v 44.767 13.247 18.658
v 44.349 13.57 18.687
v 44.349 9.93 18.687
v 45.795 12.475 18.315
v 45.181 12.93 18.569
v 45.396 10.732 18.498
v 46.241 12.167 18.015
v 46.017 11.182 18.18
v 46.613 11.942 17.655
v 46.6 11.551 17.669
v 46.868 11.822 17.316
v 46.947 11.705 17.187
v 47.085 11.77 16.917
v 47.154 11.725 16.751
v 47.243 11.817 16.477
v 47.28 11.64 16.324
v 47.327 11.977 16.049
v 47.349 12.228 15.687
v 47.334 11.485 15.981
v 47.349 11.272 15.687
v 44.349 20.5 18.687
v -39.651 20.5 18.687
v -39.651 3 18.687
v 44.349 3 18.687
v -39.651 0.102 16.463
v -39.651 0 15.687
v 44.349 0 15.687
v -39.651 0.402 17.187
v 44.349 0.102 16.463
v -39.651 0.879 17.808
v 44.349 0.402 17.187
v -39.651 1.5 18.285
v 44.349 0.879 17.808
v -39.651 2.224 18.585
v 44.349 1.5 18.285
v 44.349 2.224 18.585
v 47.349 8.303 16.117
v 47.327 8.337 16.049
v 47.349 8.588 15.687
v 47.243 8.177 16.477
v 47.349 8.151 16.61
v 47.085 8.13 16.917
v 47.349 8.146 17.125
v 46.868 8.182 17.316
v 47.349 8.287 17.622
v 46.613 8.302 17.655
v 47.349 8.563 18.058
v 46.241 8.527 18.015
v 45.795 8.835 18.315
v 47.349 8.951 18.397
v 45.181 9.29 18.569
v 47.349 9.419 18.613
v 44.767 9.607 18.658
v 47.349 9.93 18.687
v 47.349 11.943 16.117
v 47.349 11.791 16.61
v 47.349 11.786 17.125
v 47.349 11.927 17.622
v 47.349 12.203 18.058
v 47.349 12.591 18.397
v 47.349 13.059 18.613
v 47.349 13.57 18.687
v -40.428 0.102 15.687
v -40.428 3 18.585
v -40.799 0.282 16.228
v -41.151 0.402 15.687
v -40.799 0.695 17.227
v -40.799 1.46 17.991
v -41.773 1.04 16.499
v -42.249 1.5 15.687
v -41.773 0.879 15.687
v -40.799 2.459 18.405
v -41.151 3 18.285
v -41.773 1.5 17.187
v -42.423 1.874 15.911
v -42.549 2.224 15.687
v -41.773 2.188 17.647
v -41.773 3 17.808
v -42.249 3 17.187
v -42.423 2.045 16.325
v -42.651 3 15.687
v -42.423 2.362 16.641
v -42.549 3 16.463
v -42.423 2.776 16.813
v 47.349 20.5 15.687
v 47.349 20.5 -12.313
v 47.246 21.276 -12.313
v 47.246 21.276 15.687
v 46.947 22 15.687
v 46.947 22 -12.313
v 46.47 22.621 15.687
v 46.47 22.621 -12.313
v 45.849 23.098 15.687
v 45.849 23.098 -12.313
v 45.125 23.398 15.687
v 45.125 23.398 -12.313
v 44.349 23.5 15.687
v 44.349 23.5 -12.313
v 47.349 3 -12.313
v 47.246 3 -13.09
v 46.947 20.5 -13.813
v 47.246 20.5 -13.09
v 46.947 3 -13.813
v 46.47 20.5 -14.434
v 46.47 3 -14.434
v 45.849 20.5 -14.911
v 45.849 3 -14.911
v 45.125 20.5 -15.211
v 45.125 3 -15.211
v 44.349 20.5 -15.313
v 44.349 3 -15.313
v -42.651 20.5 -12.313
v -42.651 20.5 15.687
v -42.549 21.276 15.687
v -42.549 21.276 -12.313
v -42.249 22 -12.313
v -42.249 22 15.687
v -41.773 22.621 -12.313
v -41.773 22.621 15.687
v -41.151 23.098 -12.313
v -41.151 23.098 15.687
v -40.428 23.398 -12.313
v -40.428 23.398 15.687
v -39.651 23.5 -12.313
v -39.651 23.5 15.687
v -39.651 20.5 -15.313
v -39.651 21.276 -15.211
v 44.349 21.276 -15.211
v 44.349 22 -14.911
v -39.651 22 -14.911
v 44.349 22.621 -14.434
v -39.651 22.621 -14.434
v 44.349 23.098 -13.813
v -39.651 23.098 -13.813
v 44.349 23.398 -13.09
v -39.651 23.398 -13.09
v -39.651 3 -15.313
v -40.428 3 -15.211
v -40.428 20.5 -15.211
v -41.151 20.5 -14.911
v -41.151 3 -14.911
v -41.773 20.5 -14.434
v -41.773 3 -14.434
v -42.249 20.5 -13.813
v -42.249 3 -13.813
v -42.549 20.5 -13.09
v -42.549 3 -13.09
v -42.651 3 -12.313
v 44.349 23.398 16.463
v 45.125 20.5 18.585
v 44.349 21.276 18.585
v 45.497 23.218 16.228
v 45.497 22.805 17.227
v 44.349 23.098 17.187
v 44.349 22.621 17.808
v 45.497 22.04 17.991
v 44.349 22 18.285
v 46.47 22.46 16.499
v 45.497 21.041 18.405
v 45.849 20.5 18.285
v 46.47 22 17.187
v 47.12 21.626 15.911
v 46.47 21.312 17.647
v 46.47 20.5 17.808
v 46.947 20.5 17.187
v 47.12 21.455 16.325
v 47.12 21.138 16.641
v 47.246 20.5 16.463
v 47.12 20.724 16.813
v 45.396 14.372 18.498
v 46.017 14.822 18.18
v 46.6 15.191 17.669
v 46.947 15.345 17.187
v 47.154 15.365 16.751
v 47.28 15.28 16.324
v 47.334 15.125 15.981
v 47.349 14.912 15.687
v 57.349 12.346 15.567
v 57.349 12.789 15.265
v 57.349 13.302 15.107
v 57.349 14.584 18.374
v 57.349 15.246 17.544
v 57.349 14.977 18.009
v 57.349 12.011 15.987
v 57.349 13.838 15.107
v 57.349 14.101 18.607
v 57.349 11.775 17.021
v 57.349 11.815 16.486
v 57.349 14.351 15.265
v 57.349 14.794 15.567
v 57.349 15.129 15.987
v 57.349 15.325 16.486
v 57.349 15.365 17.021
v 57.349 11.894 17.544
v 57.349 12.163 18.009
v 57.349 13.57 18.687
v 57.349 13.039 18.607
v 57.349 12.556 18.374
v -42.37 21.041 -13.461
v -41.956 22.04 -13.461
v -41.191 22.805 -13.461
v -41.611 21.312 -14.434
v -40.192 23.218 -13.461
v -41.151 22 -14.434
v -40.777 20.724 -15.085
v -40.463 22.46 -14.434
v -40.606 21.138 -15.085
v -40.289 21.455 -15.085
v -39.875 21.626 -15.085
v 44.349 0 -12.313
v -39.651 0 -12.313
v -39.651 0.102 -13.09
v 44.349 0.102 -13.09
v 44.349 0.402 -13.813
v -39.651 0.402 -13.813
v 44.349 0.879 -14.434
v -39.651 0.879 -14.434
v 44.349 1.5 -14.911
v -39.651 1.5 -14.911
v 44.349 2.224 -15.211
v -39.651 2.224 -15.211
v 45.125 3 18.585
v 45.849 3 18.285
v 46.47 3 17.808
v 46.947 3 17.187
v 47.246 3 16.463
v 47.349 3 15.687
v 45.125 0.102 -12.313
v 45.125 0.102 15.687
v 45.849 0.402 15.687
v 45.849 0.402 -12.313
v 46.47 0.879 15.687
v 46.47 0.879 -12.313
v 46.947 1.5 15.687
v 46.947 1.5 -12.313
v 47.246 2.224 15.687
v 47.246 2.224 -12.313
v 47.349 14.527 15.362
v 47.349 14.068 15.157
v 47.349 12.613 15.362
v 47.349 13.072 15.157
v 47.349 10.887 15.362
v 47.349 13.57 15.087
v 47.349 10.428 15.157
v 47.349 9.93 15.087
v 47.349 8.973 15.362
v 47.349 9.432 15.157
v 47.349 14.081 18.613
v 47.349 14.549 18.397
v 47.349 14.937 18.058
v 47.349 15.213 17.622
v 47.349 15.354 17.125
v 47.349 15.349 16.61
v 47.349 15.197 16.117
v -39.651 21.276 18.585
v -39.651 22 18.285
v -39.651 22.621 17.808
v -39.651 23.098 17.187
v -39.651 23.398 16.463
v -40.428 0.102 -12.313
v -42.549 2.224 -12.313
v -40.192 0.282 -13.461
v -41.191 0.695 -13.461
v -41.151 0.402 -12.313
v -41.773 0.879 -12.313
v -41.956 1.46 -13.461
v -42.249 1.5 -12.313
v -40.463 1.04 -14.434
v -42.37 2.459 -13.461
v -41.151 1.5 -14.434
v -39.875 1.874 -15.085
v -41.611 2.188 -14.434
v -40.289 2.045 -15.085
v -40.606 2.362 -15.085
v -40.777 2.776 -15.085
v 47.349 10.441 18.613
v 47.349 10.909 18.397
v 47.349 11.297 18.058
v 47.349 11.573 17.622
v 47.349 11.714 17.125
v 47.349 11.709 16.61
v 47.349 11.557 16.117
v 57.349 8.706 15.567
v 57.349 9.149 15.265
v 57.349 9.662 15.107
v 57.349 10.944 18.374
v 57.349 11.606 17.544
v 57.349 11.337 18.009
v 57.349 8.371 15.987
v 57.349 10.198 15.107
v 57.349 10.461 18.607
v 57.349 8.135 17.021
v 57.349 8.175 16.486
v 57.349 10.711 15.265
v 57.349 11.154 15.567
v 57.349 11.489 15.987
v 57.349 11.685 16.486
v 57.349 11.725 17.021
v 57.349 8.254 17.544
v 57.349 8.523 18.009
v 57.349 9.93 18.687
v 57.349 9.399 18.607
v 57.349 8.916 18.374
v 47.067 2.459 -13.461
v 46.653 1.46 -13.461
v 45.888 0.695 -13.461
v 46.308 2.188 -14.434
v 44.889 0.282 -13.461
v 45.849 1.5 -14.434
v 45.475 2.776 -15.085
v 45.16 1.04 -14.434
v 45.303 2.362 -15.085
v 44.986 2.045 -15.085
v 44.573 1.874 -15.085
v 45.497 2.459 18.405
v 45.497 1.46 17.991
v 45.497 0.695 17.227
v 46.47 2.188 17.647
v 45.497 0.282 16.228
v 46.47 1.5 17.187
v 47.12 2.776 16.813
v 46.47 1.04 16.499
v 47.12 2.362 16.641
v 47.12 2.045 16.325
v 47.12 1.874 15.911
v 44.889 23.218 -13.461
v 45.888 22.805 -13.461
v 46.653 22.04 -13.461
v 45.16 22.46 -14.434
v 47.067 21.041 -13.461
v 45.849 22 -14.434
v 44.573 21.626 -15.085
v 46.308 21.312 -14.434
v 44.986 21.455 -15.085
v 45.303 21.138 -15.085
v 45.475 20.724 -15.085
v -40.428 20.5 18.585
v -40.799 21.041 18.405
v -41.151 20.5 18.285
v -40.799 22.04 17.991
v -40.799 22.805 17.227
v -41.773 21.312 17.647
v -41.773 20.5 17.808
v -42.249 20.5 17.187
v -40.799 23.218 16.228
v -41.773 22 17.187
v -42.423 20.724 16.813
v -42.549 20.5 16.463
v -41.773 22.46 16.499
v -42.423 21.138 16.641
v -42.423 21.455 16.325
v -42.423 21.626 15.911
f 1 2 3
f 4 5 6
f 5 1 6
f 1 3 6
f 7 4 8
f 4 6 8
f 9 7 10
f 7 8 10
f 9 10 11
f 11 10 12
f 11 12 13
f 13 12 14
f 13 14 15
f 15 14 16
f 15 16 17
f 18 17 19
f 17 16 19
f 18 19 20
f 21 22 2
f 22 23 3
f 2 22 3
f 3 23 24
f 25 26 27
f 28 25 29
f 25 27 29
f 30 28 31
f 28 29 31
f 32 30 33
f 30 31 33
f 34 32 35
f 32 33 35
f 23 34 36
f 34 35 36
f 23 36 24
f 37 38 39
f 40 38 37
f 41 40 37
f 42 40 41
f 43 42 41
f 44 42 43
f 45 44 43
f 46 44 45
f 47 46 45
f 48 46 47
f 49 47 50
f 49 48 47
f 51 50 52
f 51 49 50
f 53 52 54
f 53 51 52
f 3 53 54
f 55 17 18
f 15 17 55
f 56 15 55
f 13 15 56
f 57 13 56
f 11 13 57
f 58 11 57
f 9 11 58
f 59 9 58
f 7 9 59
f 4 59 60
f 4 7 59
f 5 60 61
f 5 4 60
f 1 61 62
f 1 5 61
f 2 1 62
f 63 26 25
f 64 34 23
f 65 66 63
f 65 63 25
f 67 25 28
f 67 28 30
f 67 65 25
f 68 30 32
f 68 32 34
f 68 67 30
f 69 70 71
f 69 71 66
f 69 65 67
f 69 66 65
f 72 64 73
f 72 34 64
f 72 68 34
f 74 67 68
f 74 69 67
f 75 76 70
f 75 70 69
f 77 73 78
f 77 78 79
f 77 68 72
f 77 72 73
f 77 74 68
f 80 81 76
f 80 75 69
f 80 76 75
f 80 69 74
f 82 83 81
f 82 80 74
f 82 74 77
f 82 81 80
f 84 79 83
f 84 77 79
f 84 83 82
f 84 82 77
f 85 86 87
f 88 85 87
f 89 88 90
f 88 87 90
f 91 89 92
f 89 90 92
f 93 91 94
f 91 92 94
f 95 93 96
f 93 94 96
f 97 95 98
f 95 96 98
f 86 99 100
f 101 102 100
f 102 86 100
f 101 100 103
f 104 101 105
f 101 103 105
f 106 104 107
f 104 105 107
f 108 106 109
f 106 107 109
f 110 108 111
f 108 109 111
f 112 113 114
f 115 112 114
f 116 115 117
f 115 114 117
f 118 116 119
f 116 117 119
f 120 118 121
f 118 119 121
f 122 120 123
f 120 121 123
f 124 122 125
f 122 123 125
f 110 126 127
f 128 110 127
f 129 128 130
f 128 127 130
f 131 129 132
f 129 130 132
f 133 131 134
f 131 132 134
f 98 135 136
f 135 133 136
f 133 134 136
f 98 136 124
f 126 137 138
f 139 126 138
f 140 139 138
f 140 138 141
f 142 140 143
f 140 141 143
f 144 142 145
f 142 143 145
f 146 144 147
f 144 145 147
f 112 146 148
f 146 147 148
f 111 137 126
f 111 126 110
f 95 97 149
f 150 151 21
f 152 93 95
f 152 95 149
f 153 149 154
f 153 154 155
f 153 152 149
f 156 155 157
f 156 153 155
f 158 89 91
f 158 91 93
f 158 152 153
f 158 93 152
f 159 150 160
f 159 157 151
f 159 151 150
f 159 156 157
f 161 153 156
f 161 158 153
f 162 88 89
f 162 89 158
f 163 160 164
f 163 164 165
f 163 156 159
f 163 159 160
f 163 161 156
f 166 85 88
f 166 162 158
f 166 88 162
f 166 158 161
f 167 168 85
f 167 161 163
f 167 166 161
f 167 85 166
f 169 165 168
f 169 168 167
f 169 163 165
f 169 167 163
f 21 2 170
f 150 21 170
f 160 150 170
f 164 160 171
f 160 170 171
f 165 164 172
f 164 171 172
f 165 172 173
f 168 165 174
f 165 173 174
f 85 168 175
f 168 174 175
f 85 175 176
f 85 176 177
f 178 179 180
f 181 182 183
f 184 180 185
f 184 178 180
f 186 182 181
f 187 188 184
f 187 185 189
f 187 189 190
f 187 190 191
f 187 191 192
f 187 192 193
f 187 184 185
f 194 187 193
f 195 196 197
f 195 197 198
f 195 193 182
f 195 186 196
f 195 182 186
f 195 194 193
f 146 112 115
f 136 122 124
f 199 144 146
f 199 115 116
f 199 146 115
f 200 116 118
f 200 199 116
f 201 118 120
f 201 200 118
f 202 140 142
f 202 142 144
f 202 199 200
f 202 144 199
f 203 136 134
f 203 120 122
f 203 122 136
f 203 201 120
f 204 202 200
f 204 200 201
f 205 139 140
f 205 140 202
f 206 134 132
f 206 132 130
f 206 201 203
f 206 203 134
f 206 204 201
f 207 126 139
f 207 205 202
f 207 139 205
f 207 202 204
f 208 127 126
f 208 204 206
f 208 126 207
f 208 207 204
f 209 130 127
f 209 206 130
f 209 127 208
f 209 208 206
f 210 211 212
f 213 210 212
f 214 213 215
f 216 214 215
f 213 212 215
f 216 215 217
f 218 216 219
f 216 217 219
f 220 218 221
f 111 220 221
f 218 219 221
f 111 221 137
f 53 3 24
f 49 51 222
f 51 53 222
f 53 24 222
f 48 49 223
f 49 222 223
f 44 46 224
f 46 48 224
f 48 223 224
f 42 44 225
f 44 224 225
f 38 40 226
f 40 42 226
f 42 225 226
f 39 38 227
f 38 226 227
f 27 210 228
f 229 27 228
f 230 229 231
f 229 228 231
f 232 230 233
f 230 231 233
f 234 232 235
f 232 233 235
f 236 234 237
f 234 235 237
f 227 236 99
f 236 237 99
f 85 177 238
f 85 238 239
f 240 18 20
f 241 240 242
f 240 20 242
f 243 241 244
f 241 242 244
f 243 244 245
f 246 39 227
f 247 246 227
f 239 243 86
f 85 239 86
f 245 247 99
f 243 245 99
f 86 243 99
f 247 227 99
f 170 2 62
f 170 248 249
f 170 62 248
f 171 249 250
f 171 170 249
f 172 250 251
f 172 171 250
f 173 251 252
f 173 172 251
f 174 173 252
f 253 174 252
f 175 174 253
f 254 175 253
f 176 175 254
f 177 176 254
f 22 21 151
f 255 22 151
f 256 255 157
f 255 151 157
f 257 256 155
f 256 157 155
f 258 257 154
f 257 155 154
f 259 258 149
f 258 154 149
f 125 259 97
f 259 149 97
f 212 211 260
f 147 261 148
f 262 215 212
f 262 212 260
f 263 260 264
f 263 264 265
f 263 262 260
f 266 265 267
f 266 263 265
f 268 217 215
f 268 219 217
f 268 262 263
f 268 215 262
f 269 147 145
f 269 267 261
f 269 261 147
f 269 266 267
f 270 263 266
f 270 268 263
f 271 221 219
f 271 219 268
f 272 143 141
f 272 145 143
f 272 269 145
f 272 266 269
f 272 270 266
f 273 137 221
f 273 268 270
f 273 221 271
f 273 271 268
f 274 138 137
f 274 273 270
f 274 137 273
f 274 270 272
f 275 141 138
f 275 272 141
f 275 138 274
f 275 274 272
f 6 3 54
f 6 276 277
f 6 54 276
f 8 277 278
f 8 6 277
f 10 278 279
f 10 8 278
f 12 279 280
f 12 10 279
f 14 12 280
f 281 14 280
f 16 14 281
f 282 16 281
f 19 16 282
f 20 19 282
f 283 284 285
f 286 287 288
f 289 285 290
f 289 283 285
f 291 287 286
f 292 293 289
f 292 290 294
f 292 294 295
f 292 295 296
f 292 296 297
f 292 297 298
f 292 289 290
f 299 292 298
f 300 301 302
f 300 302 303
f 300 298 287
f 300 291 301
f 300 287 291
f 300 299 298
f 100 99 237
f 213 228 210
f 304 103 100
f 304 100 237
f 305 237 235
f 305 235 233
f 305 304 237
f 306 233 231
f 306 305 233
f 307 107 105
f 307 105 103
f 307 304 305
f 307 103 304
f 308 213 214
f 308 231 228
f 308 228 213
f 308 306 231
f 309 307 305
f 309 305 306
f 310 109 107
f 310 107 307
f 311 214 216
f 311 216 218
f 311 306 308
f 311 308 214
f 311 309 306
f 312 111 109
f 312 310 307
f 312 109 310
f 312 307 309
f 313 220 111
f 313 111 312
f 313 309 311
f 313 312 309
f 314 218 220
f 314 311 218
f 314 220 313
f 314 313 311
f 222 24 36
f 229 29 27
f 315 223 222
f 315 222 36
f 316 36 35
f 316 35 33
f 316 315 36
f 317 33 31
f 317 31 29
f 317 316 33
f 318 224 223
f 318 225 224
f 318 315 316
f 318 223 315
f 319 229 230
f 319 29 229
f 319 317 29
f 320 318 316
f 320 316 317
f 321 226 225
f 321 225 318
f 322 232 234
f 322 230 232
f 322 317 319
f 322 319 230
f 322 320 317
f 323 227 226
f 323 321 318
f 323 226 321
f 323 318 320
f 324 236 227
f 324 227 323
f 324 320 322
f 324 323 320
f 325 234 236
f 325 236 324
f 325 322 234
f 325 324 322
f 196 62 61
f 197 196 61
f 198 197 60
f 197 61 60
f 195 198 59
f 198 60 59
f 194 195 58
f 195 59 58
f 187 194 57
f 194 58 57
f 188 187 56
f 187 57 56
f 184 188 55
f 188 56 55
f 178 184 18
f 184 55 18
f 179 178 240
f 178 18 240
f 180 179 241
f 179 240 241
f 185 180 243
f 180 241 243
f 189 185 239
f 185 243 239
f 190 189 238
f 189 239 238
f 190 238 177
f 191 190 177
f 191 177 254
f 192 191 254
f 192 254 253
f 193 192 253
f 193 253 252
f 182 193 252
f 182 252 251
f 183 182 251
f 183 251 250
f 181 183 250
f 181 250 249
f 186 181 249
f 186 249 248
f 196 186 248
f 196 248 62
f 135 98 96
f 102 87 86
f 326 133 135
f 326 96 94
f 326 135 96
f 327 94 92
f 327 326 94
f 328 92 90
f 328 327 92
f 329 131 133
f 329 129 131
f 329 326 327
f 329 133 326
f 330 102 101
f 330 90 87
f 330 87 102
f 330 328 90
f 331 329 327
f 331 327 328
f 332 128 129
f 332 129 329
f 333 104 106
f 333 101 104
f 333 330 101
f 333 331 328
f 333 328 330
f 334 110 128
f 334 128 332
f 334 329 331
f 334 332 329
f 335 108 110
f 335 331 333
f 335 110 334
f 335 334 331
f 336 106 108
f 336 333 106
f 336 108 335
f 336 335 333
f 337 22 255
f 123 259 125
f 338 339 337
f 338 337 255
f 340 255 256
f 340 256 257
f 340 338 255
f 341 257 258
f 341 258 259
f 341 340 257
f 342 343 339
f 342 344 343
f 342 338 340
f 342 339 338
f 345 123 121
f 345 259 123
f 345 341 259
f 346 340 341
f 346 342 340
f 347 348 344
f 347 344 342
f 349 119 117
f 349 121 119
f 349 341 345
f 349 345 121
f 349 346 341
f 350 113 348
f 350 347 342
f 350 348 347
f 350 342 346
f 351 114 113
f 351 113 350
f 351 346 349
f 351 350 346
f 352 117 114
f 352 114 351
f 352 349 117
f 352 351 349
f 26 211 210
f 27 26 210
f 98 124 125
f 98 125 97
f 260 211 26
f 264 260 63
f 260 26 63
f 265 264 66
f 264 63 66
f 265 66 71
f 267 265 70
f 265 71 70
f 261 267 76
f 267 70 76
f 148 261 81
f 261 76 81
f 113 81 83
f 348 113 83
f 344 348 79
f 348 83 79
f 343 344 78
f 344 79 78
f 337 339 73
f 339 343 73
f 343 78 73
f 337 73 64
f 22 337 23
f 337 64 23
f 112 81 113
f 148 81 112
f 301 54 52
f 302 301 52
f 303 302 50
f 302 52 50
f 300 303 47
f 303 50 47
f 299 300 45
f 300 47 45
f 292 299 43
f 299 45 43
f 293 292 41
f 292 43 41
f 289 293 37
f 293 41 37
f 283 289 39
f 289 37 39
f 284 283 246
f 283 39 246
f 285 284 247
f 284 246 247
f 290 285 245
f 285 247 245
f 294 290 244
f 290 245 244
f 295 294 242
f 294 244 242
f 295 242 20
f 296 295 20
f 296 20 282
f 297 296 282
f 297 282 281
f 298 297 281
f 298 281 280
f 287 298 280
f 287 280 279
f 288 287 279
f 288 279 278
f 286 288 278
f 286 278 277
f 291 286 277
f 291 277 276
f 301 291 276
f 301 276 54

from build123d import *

# Parameters (mm, degrees)
SKETCH1_W           = 90
SKETCH1_H           = 34
BOSS_EXTRUDE1_DEPTH = 23.5
SKETCH2_R           = 1.8
BOSS_EXTRUDE4_DEPTH = 10
FILLET1_R           = 3


with BuildPart() as part:
    # Sketch1 → Boss-Extrude1 (new body)
    with BuildSketch(Plane(origin=(0, 0, 0), x_dir=(1, 0, 0), z_dir=(0, 1, 0))):
        with Locations((2.348643006, -1.686847599)):
            Rectangle(SKETCH1_W, SKETCH1_H)
    extrude(amount=BOSS_EXTRUDE1_DEPTH)

    # Sketch2 → Boss-Extrude4 (add)
    with BuildSketch(Plane(origin=(47.348643006, 0, 0), x_dir=(0, 0, -1), z_dir=(1, 0, 0))):
        with Locations(Location((-16.886847599, 13.57, 0), (0, 0, 180))):
            Circle(SKETCH2_R)
        with Locations(Location((-16.886847599, 9.93, 0), (0, 0, 180))):
            Circle(SKETCH2_R)
    extrude(amount=BOSS_EXTRUDE4_DEPTH)

    # Fillet1
    # the kernel refuses this fillet: 3 mm, written as the material it takes off along each edge
    with BuildSketch(Plane(origin=(44.348643006, 20.5, -12.313152401), x_dir=(1, 0, 0), z_dir=(0, 0, -1))) as fillet1_piece_1_section:
        Polygon((0, 0), (FILLET1_R * 1.02, 0), (FILLET1_R * 1.02, -FILLET1_R * 1.02), (0, -FILLET1_R * 1.02), align=None)
    fillet1_piece_1 = extrude(amount=FILLET1_R * 1.02, mode=Mode.PRIVATE)
    fillet1_piece_1 = fillet1_piece_1 - Plane(origin=(44.348643006, 20.5, -12.313152401), x_dir=(-0.7071067811865475, -0.7071067811865475, 0), z_dir=(0, 0, -1)) * Sphere(FILLET1_R, mode=Mode.PRIVATE)
    add(fillet1_piece_1, mode=Mode.SUBTRACT)
    with BuildSketch(Plane(origin=(44.348643006, 20.5, 15.686847599), x_dir=(0, 1, 0), z_dir=(1, 0, 0))) as fillet1_piece_2_section:
        Polygon((0, 0), (FILLET1_R * 1.02, 0), (FILLET1_R * 1.02, FILLET1_R * 1.02), (0, FILLET1_R * 1.02), align=None)
    fillet1_piece_2 = extrude(amount=FILLET1_R * 1.02, mode=Mode.PRIVATE)
    fillet1_piece_2 = fillet1_piece_2 - Plane(origin=(44.348643006, 20.5, 15.686847599), x_dir=(0, -0.7071067811865475, -0.7071067811865475), z_dir=(1, 0, 0)) * Sphere(FILLET1_R, mode=Mode.PRIVATE)
    add(fillet1_piece_2, mode=Mode.SUBTRACT)
    with BuildSketch(Plane(origin=(-39.651356994, 20.5, -12.313152401), x_dir=(-1, 0, 0), z_dir=(0, 0, -1))) as fillet1_piece_3_section:
        Polygon((0, 0), (FILLET1_R * 1.02, 0), (FILLET1_R * 1.02, FILLET1_R * 1.02), (0, FILLET1_R * 1.02), align=None)
    fillet1_piece_3 = extrude(amount=FILLET1_R * 1.02, mode=Mode.PRIVATE)
    fillet1_piece_3 = fillet1_piece_3 - Plane(origin=(-39.651356994, 20.5, -12.313152401), x_dir=(0.7071067811865475, -0.7071067811865475, 0), z_dir=(0, 0, -1)) * Sphere(FILLET1_R, mode=Mode.PRIVATE)
    add(fillet1_piece_3, mode=Mode.SUBTRACT)
    with BuildSketch(Plane(origin=(44.348643006, 3, 15.686847599), x_dir=(0, -1, 0), z_dir=(1, 0, 0))) as fillet1_piece_4_section:
        Polygon((0, 0), (FILLET1_R * 1.02, 0), (FILLET1_R * 1.02, -FILLET1_R * 1.02), (0, -FILLET1_R * 1.02), align=None)
    fillet1_piece_4 = extrude(amount=FILLET1_R * 1.02, mode=Mode.PRIVATE)
    fillet1_piece_4 = fillet1_piece_4 - Plane(origin=(44.348643006, 3, 15.686847599), x_dir=(0, 0.7071067811865475, -0.7071067811865475), z_dir=(1, 0, 0)) * Sphere(FILLET1_R, mode=Mode.PRIVATE)
    add(fillet1_piece_4, mode=Mode.SUBTRACT)
    with BuildSketch(Plane(origin=(-39.651356994, 20.5, 15.686847599), x_dir=(0, 1, 0), z_dir=(-1, 0, 0))) as fillet1_piece_5_section:
        Polygon((0, 0), (FILLET1_R * 1.02, 0), (FILLET1_R * 1.02, -FILLET1_R * 1.02), (0, -FILLET1_R * 1.02), align=None)
    fillet1_piece_5 = extrude(amount=FILLET1_R * 1.02, mode=Mode.PRIVATE)
    fillet1_piece_5 = fillet1_piece_5 - Plane(origin=(-39.651356994, 20.5, 15.686847599), x_dir=(0, -0.7071067811865475, -0.7071067811865475), z_dir=(-1, 0, 0)) * Sphere(FILLET1_R, mode=Mode.PRIVATE)
    add(fillet1_piece_5, mode=Mode.SUBTRACT)
    with BuildSketch(Plane(origin=(-39.651356994, 3, -12.313152401), x_dir=(-1, 0, 0), z_dir=(0, 0, -1))) as fillet1_piece_6_section:
        Polygon((0, 0), (FILLET1_R * 1.02, 0), (FILLET1_R * 1.02, -FILLET1_R * 1.02), (0, -FILLET1_R * 1.02), align=None)
    fillet1_piece_6 = extrude(amount=FILLET1_R * 1.02, mode=Mode.PRIVATE)
    fillet1_piece_6 = fillet1_piece_6 - Plane(origin=(-39.651356994, 3, -12.313152401), x_dir=(0.7071067811865475, 0.7071067811865475, 0), z_dir=(0, 0, -1)) * Sphere(FILLET1_R, mode=Mode.PRIVATE)
    add(fillet1_piece_6, mode=Mode.SUBTRACT)
    with BuildSketch(Plane(origin=(44.348643006, 3, -12.313152401), x_dir=(1, 0, 0), z_dir=(0, 0, -1))) as fillet1_piece_7_section:
        Polygon((0, 0), (FILLET1_R * 1.02, 0), (FILLET1_R * 1.02, FILLET1_R * 1.02), (0, FILLET1_R * 1.02), align=None)
    fillet1_piece_7 = extrude(amount=FILLET1_R * 1.02, mode=Mode.PRIVATE)
    fillet1_piece_7 = fillet1_piece_7 - Plane(origin=(44.348643006, 3, -12.313152401), x_dir=(-0.7071067811865475, 0.7071067811865475, 0), z_dir=(0, 0, -1)) * Sphere(FILLET1_R, mode=Mode.PRIVATE)
    add(fillet1_piece_7, mode=Mode.SUBTRACT)
    with BuildSketch(Plane(origin=(-39.651356994, 3, 15.686847599), x_dir=(0, -1, 0), z_dir=(-1, 0, 0))) as fillet1_piece_8_section:
        Polygon((0, 0), (FILLET1_R * 1.02, 0), (FILLET1_R * 1.02, FILLET1_R * 1.02), (0, FILLET1_R * 1.02), align=None)
    fillet1_piece_8 = extrude(amount=FILLET1_R * 1.02, mode=Mode.PRIVATE)
    fillet1_piece_8 = fillet1_piece_8 - Plane(origin=(-39.651356994, 3, 15.686847599), x_dir=(0, 0.7071067811865475, -0.7071067811865475), z_dir=(-1, 0, 0)) * Sphere(FILLET1_R, mode=Mode.PRIVATE)
    add(fillet1_piece_8, mode=Mode.SUBTRACT)
    with BuildSketch(Plane(origin=(47.348643006, 23.5, -12.313152401), x_dir=(0, -1, 0), z_dir=(0, 0, 1)), Plane(origin=(-42.651356994, 23.5, 15.686847599), x_dir=(0, -1, 0), z_dir=(0, 0, -1))) as fillet1_piece_9:
        with BuildLine():
            CenterArc((FILLET1_R, -FILLET1_R), FILLET1_R, 90, 90)
            Line((0, -FILLET1_R), (0, 0))
            Line((0, 0), (FILLET1_R, 0))
        make_face()
    extrude(amount=28, mode=Mode.SUBTRACT)
    with BuildSketch(Plane(origin=(-39.651356994, 23.5, -15.313152401), x_dir=(0, -1, 0), z_dir=(1, 0, 0)), Plane(origin=(44.348643006, 0, 18.686847599), x_dir=(0, 0, -1), z_dir=(-1, 0, 0))) as fillet1_piece_10:
        with BuildLine():
            CenterArc((FILLET1_R, -FILLET1_R), FILLET1_R, 90, 90)
            Line((0, -FILLET1_R), (0, 0))
            Line((0, 0), (FILLET1_R, 0))
        make_face()
    extrude(amount=84, mode=Mode.SUBTRACT)
    with BuildSketch(Plane(origin=(47.348643006, 9.93, 18.686847599), x_dir=(0, 0, -1), z_dir=(0, 1, 0))) as fillet1_piece_11_section:
        with BuildLine():
            CenterArc((FILLET1_R, FILLET1_R), FILLET1_R, 180, 90)
            Line((0, FILLET1_R), (0, 0))
            Line((0, 0), (FILLET1_R, 0))
        make_face()
    fillet1_piece_11 = extrude(amount=3.64, mode=Mode.PRIVATE)
    fillet1_piece_11 = fillet1_piece_11 - Plane(origin=(46.419832721, 13.57, 16.886847599), x_dir=(0, 0, 1), z_dir=(-1, 0, 0)) * Cylinder(1.8, 20, mode=Mode.PRIVATE)
    fillet1_piece_11 = fillet1_piece_11 - Plane(origin=(46.419832721, 9.93, 16.886847599), x_dir=(0, 0, 1), z_dir=(-1, 0, 0)) * Cylinder(1.8, 20, mode=Mode.PRIVATE)
    add(fillet1_piece_11, mode=Mode.SUBTRACT)
    with BuildSketch(Plane(origin=(47.348643006, 3, 18.686847599), x_dir=(0, 0, -1), z_dir=(0, 1, 0))) as fillet1_piece_12_section:
        with BuildLine():
            CenterArc((FILLET1_R, FILLET1_R), FILLET1_R, 180, 90)
            Line((0, FILLET1_R), (0, 0))
            Line((0, 0), (FILLET1_R, 0))
        make_face()
    fillet1_piece_12 = extrude(amount=6.93, mode=Mode.PRIVATE)
    fillet1_piece_12 = fillet1_piece_12 - Plane(origin=(46.65046867, 9.93, 16.886847599), x_dir=(0, 0, 1), z_dir=(-1, 0, 0)) * Cylinder(1.8, 26, mode=Mode.PRIVATE)
    add(fillet1_piece_12, mode=Mode.SUBTRACT)
    with BuildSketch(Plane(origin=(-39.651356994, 0, -15.313152401), x_dir=(0, 1, 0), z_dir=(1, 0, 0)), Plane(origin=(44.348643006, 23.5, 18.686847599), x_dir=(0, 0, -1), z_dir=(-1, 0, 0))) as fillet1_piece_13:
        with BuildLine():
            CenterArc((FILLET1_R, FILLET1_R), FILLET1_R, 180, 90)
            Line((0, FILLET1_R), (0, 0))
            Line((0, 0), (FILLET1_R, 0))
        make_face()
    extrude(amount=84, mode=Mode.SUBTRACT)
    with BuildSketch(Plane(origin=(47.348643006, 0, -12.313152401), x_dir=(0, 1, 0), z_dir=(0, 0, 1)), Plane(origin=(-42.651356994, 0, 15.686847599), x_dir=(0, 1, 0), z_dir=(0, 0, -1))) as fillet1_piece_14:
        with BuildLine():
            CenterArc((FILLET1_R, FILLET1_R), FILLET1_R, 180, 90)
            Line((0, FILLET1_R), (0, 0))
            Line((0, 0), (FILLET1_R, 0))
        make_face()
    extrude(amount=28, mode=Mode.SUBTRACT)
    with BuildSketch(Plane(origin=(-42.651356994, 3, -15.313152401), x_dir=(1, 0, 0), z_dir=(0, 1, 0)), Plane(origin=(-42.651356994, 3, 18.686847599), x_dir=(0, 0, -1), z_dir=(0, 1, 0))) as fillet1_piece_15:
        with BuildLine():
            CenterArc((FILLET1_R, -FILLET1_R), FILLET1_R, 90, 90)
            Line((0, -FILLET1_R), (0, 0))
            Line((0, 0), (FILLET1_R, 0))
        make_face()
    extrude(amount=17.5, mode=Mode.SUBTRACT)
    with BuildSketch(Plane(origin=(47.348643006, 3, -15.313152401), x_dir=(-1, 0, 0), z_dir=(0, 1, 0))) as fillet1_piece_16:
        with BuildLine():
            CenterArc((FILLET1_R, FILLET1_R), FILLET1_R, 180, 90)
            Line((0, FILLET1_R), (0, 0))
            Line((0, 0), (FILLET1_R, 0))
        make_face()
    extrude(amount=17.5, mode=Mode.SUBTRACT)
    with BuildSketch(Plane(origin=(47.348643006, 13.57, 18.686847599), x_dir=(0, 0, -1), z_dir=(0, 1, 0))) as fillet1_piece_17_section:
        with BuildLine():
            CenterArc((FILLET1_R, FILLET1_R), FILLET1_R, 180, 90)
            Line((0, FILLET1_R), (0, 0))
            Line((0, 0), (FILLET1_R, 0))
        make_face()
    fillet1_piece_17 = extrude(amount=6.93, mode=Mode.PRIVATE)
    fillet1_piece_17 = fillet1_piece_17 - Plane(origin=(46.65046859, 13.57, 16.886847599), x_dir=(0, 0, 1), z_dir=(-1, 0, 0)) * Cylinder(1.8, 26, mode=Mode.PRIVATE)
    add(fillet1_piece_17, mode=Mode.SUBTRACT)


solid = part.part
